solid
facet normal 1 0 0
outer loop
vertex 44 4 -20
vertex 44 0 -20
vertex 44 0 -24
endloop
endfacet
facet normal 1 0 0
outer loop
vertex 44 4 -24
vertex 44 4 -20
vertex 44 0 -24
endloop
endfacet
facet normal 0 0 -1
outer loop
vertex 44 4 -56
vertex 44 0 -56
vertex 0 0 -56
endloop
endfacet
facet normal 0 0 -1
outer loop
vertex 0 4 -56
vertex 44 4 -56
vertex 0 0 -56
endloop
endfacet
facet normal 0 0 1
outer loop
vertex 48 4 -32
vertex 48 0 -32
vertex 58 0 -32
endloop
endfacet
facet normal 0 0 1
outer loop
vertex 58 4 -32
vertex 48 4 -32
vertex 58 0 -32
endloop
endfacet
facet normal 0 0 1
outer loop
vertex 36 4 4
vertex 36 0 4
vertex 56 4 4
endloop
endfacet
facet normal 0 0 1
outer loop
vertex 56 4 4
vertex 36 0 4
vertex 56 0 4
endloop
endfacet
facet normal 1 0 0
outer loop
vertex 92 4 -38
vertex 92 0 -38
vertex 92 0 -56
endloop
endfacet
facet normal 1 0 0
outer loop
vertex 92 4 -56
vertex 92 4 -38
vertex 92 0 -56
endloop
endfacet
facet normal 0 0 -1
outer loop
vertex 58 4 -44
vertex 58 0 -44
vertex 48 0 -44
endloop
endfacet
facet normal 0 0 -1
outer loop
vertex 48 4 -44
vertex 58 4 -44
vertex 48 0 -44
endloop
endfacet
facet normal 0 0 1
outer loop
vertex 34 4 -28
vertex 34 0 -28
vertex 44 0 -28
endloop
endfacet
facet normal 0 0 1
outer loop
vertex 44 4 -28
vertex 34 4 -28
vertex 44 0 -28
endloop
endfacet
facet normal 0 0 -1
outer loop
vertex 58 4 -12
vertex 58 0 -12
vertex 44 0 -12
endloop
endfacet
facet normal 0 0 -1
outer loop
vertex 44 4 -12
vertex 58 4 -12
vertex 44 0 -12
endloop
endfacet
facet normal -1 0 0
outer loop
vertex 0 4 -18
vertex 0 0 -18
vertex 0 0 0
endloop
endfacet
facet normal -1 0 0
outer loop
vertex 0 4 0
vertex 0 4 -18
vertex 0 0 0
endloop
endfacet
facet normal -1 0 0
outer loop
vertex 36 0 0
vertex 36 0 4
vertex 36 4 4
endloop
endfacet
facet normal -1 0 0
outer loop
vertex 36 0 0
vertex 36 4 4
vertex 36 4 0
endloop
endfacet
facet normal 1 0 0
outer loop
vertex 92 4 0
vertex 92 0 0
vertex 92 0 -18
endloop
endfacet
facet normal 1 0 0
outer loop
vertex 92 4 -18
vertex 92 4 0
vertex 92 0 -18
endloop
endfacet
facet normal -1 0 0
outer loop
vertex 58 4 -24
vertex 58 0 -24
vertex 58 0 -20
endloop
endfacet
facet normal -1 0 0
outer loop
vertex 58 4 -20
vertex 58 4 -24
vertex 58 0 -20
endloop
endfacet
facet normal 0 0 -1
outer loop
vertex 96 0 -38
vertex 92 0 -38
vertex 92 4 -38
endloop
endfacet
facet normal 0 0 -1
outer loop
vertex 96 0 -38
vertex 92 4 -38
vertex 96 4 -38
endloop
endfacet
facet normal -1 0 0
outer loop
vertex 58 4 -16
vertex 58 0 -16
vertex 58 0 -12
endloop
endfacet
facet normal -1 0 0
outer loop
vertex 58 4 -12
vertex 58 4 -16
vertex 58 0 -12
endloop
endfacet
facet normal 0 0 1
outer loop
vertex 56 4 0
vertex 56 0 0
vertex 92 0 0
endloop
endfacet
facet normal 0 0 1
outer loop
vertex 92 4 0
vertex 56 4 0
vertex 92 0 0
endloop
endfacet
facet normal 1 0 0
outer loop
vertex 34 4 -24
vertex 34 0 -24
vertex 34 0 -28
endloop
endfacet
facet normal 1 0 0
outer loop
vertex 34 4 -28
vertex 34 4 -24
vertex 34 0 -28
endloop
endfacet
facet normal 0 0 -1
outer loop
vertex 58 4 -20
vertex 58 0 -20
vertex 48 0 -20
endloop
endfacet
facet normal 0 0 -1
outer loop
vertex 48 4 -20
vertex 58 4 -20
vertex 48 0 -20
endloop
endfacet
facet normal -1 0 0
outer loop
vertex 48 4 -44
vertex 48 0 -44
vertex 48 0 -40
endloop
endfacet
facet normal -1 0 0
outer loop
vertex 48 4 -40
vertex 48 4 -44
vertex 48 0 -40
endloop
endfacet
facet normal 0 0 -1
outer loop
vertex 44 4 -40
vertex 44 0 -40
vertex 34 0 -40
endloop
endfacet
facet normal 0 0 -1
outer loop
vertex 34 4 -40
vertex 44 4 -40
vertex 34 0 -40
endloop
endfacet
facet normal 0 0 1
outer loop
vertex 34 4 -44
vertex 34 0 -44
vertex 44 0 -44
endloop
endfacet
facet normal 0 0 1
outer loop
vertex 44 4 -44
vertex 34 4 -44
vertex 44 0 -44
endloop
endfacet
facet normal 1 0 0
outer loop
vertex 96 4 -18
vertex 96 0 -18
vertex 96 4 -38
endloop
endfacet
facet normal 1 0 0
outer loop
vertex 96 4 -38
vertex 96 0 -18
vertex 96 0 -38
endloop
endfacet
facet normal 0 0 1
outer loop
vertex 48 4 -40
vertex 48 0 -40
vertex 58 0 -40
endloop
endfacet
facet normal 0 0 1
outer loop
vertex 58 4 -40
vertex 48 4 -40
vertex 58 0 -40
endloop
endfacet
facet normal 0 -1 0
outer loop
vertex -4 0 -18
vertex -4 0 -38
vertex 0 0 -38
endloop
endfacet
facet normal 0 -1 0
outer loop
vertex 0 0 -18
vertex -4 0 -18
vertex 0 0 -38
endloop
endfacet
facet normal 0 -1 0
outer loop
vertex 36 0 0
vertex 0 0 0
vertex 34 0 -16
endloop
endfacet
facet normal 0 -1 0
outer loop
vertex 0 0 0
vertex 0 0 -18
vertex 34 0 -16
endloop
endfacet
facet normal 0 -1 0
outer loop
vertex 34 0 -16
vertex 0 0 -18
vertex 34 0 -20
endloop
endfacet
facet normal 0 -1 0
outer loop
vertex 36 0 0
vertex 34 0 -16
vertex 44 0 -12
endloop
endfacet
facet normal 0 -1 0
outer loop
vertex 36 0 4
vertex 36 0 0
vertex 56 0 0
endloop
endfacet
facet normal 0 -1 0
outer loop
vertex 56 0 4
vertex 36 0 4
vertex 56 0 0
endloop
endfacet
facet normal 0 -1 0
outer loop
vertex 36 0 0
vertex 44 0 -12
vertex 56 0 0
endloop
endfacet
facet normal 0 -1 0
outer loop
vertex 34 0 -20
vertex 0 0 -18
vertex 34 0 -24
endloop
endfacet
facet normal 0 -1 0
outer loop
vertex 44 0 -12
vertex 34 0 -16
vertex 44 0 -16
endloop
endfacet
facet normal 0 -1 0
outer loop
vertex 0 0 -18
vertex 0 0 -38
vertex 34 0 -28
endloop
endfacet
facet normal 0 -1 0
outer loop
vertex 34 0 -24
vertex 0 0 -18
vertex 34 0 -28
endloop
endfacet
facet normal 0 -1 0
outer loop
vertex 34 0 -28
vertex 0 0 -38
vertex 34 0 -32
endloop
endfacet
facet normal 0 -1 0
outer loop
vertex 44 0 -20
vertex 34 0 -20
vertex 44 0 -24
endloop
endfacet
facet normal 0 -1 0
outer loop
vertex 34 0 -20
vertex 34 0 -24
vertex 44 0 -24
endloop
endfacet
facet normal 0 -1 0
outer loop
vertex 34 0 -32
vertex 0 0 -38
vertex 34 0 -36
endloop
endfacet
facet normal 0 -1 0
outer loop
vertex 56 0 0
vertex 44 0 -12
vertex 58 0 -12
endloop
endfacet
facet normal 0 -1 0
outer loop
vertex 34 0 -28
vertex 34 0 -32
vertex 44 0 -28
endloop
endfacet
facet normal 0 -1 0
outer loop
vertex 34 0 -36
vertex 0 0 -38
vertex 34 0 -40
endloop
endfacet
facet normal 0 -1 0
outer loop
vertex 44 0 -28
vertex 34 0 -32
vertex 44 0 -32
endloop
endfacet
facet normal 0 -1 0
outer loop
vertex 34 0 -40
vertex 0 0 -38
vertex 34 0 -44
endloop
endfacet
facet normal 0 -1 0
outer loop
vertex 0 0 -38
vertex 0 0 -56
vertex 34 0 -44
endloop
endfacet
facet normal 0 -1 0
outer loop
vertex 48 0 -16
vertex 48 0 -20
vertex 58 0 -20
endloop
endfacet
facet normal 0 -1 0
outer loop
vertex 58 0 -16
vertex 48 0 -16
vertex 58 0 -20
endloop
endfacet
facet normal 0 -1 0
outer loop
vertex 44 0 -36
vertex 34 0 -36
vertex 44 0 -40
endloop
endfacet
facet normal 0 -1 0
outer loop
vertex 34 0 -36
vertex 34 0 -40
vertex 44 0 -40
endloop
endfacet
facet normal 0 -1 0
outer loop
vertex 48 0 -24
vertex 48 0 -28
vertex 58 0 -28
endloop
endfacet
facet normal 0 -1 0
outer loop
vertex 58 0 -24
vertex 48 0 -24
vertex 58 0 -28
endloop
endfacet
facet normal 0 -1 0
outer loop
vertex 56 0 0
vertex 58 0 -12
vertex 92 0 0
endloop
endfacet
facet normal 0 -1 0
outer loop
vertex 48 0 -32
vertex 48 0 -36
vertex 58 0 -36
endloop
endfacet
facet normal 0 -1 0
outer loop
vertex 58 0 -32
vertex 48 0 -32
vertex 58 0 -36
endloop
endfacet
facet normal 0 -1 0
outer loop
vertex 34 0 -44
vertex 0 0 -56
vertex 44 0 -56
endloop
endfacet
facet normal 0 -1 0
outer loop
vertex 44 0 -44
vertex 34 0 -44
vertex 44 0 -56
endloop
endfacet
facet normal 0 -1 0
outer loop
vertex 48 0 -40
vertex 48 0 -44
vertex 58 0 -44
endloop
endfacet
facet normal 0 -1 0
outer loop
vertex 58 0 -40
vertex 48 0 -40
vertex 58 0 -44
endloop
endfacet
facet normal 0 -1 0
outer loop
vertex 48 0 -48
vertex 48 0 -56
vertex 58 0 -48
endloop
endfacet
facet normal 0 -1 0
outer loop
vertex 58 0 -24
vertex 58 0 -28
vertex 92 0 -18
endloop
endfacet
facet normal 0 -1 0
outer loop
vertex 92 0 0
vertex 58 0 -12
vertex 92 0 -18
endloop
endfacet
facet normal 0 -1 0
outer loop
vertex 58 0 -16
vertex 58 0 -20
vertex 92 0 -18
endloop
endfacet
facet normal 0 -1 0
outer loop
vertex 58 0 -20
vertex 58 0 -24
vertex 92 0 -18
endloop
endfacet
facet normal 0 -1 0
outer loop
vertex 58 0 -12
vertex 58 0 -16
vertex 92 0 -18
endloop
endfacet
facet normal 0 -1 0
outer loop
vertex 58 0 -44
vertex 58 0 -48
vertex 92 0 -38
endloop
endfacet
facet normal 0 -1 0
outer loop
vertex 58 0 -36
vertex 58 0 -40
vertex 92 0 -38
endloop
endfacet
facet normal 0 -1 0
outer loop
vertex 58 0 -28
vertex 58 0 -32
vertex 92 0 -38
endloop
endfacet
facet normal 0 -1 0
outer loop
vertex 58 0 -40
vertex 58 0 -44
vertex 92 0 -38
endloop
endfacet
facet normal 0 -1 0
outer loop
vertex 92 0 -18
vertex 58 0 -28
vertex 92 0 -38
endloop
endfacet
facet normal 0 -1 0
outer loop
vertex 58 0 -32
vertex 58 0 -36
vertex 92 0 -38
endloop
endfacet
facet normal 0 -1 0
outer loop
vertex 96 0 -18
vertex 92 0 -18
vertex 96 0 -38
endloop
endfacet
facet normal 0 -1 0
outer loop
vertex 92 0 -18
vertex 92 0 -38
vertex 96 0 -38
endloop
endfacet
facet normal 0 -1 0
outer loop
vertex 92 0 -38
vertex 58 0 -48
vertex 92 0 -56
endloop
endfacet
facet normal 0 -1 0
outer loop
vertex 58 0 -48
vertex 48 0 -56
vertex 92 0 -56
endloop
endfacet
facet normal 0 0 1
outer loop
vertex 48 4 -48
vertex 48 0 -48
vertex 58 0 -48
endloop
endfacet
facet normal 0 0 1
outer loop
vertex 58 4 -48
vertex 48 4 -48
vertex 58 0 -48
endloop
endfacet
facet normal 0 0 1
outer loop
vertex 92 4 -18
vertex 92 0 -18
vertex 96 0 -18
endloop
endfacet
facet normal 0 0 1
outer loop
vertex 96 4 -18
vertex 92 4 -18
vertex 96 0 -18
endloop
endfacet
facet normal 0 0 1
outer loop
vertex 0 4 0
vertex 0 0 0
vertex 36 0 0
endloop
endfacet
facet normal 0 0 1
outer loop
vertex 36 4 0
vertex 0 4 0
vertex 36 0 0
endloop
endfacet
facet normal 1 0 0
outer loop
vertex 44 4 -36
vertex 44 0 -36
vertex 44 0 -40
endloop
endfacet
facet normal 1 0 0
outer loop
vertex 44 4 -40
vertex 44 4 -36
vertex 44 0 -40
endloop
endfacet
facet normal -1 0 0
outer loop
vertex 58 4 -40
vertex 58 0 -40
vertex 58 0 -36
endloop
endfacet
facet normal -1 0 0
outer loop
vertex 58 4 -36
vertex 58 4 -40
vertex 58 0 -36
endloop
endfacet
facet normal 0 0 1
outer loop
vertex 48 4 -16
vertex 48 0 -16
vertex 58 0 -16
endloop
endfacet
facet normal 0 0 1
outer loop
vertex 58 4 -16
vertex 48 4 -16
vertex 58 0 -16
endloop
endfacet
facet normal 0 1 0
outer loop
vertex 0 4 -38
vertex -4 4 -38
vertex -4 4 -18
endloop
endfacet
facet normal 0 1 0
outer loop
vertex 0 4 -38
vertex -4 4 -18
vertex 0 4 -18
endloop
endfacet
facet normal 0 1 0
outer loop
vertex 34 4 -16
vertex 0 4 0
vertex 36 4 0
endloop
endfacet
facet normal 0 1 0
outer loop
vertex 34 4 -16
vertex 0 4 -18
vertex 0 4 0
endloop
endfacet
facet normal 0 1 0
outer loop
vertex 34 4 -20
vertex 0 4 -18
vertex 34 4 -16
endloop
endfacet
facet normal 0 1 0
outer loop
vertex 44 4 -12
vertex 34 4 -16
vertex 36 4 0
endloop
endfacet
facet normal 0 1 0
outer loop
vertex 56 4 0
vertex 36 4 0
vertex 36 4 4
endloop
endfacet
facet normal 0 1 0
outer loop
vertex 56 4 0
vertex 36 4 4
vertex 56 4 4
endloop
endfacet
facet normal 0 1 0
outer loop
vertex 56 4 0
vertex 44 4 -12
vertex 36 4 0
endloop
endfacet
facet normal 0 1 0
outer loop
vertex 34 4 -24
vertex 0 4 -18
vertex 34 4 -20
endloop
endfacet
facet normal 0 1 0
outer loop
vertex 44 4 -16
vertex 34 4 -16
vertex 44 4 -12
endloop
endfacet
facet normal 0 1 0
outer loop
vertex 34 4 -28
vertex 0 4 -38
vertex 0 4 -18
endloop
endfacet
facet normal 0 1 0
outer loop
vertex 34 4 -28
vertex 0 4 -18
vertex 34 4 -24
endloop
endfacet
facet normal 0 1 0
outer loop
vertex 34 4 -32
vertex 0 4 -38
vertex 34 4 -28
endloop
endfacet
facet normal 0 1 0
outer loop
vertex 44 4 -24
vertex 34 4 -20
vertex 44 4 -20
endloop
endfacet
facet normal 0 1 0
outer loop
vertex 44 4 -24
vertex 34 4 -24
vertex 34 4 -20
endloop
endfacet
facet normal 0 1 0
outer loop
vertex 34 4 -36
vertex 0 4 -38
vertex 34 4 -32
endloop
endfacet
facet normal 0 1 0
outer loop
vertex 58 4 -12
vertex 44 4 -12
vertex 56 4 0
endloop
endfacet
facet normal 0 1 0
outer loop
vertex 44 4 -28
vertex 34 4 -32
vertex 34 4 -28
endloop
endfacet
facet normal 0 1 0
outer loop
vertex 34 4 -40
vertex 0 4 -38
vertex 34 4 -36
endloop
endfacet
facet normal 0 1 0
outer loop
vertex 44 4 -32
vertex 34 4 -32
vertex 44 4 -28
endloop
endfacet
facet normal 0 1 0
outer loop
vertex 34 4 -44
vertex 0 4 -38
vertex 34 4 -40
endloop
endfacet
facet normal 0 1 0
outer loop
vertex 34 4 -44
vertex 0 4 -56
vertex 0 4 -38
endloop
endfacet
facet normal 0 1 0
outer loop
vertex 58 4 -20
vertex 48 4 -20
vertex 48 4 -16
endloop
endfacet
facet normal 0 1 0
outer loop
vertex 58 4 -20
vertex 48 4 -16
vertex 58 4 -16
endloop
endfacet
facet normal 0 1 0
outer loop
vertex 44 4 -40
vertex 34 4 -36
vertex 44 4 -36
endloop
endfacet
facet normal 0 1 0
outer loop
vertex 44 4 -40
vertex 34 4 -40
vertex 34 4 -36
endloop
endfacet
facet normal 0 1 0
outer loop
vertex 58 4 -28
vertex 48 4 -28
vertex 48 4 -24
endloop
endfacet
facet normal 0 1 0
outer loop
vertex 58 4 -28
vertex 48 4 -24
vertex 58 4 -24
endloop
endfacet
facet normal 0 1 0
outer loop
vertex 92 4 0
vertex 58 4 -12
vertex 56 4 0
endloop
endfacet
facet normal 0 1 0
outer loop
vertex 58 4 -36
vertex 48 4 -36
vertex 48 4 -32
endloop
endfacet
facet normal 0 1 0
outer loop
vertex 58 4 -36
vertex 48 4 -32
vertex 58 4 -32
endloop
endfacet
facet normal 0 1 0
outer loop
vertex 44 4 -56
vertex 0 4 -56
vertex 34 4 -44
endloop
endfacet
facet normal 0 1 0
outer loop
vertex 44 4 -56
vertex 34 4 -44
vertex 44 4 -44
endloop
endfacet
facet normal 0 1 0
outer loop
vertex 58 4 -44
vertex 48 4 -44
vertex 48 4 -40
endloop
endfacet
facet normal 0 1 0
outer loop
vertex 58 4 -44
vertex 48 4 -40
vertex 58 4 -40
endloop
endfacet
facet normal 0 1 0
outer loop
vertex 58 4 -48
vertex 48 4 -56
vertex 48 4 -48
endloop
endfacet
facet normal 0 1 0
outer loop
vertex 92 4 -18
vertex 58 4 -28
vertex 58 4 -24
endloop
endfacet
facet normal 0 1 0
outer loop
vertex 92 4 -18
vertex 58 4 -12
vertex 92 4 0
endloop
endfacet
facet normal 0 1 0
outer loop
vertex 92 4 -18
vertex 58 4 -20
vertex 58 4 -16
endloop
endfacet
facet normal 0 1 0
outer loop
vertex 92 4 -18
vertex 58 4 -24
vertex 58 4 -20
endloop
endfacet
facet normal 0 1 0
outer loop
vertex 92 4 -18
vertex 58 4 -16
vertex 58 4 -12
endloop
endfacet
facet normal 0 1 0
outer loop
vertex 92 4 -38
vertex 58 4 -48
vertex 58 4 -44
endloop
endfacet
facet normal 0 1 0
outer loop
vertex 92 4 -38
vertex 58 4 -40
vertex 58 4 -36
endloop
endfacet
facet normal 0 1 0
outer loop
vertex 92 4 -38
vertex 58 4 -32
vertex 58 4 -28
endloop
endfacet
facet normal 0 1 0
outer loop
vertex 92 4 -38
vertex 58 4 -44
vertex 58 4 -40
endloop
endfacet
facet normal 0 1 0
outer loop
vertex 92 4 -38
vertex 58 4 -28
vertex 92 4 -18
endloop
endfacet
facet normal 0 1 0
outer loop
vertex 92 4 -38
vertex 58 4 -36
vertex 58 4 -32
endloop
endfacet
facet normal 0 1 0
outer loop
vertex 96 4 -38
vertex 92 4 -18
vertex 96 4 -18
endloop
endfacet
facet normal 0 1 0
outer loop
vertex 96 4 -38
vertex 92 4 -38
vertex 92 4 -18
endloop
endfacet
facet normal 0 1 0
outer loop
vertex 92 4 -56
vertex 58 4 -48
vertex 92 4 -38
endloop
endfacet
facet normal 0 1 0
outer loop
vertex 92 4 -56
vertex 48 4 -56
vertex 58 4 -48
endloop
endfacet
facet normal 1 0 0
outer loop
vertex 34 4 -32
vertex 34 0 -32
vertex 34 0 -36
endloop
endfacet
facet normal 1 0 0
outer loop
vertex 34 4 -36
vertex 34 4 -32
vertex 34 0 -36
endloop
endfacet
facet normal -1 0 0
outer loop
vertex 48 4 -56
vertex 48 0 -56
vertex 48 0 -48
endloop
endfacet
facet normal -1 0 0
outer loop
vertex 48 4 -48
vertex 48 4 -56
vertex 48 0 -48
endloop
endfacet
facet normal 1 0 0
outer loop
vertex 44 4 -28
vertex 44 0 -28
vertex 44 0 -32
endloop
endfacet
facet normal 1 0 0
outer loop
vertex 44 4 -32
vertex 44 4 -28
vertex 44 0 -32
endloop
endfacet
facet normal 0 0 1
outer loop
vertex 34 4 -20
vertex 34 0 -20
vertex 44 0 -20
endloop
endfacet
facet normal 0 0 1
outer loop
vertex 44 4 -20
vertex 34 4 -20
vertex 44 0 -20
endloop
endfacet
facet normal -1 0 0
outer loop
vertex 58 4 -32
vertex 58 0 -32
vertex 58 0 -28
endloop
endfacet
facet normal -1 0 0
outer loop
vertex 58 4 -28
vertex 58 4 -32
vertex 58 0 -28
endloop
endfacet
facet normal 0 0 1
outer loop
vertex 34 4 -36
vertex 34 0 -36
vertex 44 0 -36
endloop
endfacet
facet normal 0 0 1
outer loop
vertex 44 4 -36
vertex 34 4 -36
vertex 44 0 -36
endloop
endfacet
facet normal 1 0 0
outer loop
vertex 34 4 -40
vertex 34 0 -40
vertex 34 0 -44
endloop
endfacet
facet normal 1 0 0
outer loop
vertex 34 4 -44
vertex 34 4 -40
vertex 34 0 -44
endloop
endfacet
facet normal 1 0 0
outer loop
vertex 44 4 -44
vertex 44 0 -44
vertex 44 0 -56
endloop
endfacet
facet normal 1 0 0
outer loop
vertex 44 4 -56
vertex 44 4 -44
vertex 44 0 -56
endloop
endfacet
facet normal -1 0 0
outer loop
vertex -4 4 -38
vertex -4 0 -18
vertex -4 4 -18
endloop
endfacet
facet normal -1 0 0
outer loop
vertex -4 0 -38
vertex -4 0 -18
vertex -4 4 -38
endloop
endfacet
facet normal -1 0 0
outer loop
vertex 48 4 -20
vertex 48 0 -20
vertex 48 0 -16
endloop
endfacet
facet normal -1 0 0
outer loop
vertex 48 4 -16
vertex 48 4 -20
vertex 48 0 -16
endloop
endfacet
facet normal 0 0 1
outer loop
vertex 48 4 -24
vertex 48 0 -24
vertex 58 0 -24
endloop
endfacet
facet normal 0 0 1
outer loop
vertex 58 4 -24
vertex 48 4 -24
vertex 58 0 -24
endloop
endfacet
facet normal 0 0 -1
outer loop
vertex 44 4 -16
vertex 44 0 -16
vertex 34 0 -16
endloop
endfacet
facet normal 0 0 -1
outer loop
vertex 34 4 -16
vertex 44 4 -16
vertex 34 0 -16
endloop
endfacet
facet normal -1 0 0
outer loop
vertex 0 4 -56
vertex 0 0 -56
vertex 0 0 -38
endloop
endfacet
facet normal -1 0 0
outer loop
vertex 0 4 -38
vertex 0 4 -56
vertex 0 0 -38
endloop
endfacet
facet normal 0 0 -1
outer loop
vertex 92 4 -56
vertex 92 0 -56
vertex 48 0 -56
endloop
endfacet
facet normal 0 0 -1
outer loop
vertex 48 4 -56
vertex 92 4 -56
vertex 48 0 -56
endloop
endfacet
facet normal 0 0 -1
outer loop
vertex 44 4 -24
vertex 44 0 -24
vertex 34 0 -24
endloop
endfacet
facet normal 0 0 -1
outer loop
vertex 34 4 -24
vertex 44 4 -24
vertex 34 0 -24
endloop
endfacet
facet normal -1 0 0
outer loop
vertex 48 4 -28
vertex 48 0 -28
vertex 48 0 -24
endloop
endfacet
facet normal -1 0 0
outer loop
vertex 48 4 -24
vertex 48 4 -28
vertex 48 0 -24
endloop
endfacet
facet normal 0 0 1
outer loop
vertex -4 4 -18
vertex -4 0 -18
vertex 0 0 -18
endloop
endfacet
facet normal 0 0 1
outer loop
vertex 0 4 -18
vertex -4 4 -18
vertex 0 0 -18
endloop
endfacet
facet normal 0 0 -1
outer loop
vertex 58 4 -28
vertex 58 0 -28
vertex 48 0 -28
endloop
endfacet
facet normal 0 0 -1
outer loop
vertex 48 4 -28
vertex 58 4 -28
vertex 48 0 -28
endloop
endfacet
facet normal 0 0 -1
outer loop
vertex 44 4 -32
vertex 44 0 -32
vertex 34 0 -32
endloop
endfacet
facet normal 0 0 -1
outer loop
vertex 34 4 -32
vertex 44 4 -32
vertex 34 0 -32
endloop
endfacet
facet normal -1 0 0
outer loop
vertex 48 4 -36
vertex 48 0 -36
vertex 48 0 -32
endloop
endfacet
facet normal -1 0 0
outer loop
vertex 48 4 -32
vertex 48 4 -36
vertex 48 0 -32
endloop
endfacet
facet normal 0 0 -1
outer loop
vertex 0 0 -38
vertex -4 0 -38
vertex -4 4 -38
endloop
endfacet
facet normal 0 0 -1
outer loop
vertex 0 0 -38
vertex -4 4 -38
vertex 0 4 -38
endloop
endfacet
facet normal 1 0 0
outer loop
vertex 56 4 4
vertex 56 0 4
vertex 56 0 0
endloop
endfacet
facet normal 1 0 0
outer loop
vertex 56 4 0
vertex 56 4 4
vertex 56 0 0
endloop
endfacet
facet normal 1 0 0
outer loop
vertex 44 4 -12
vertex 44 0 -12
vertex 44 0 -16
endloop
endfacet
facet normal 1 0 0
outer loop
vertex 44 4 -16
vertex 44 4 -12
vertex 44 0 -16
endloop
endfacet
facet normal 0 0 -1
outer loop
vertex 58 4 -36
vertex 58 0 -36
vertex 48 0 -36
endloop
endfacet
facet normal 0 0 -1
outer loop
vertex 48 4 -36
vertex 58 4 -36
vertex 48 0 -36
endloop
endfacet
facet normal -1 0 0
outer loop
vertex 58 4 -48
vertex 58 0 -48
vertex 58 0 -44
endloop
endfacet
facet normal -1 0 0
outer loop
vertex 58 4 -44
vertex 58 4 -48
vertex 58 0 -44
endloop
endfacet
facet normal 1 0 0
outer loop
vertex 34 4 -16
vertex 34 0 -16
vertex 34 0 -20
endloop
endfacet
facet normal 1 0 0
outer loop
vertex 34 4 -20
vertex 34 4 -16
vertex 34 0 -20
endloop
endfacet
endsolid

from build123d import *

# Parameters (mm, degrees)
SKETCH_1_W      = 4
SKETCH_1_H      = 20
SKETCH_1_W_2    = 20
SKETCH_1_H_2    = 4
EXTRUDE_2_DEPTH = 4


with BuildPart() as part:
    # 草图1 → 凸台-拉伸2 (new body)
    with BuildSketch(Plane(origin=(0, 0, 0), x_dir=(1, 0, 0), z_dir=(0, 1, 0))):
        Polygon((0, 18), (0, 0), (36, 0), (56, 0), (92, 0), (92, 18), (92, 38), (92, 56), (48, 56), (48, 48), (58, 48), (58, 44), (48, 44), (48, 40), (58, 40), (58, 36), (48, 36), (48, 34), (48, 32), (58, 32), (58, 28), (48, 28), (48, 24), (58, 24), (58, 20), (48, 20), (48, 16), (58, 16), (58, 12), (48, 12), (44, 12), (44, 16), (34, 16), (34, 20), (44, 20), (44, 24), (34, 24), (34, 28), (44, 28), (44, 32), (34, 32), (34, 36), (44, 36), (44, 40), (34, 40), (34, 44), (44, 44), (44, 56), (0, 56), (0, 38), align=None)
        with Locations((-2, 28)):
            Rectangle(SKETCH_1_W, SKETCH_1_H)
        with Locations((46, -2)):
            Rectangle(SKETCH_1_W_2, SKETCH_1_H_2)
        with Locations((94, 28)):
            Rectangle(SKETCH_1_W, SKETCH_1_H)
    extrude(amount=EXTRUDE_2_DEPTH)


solid = part.part
